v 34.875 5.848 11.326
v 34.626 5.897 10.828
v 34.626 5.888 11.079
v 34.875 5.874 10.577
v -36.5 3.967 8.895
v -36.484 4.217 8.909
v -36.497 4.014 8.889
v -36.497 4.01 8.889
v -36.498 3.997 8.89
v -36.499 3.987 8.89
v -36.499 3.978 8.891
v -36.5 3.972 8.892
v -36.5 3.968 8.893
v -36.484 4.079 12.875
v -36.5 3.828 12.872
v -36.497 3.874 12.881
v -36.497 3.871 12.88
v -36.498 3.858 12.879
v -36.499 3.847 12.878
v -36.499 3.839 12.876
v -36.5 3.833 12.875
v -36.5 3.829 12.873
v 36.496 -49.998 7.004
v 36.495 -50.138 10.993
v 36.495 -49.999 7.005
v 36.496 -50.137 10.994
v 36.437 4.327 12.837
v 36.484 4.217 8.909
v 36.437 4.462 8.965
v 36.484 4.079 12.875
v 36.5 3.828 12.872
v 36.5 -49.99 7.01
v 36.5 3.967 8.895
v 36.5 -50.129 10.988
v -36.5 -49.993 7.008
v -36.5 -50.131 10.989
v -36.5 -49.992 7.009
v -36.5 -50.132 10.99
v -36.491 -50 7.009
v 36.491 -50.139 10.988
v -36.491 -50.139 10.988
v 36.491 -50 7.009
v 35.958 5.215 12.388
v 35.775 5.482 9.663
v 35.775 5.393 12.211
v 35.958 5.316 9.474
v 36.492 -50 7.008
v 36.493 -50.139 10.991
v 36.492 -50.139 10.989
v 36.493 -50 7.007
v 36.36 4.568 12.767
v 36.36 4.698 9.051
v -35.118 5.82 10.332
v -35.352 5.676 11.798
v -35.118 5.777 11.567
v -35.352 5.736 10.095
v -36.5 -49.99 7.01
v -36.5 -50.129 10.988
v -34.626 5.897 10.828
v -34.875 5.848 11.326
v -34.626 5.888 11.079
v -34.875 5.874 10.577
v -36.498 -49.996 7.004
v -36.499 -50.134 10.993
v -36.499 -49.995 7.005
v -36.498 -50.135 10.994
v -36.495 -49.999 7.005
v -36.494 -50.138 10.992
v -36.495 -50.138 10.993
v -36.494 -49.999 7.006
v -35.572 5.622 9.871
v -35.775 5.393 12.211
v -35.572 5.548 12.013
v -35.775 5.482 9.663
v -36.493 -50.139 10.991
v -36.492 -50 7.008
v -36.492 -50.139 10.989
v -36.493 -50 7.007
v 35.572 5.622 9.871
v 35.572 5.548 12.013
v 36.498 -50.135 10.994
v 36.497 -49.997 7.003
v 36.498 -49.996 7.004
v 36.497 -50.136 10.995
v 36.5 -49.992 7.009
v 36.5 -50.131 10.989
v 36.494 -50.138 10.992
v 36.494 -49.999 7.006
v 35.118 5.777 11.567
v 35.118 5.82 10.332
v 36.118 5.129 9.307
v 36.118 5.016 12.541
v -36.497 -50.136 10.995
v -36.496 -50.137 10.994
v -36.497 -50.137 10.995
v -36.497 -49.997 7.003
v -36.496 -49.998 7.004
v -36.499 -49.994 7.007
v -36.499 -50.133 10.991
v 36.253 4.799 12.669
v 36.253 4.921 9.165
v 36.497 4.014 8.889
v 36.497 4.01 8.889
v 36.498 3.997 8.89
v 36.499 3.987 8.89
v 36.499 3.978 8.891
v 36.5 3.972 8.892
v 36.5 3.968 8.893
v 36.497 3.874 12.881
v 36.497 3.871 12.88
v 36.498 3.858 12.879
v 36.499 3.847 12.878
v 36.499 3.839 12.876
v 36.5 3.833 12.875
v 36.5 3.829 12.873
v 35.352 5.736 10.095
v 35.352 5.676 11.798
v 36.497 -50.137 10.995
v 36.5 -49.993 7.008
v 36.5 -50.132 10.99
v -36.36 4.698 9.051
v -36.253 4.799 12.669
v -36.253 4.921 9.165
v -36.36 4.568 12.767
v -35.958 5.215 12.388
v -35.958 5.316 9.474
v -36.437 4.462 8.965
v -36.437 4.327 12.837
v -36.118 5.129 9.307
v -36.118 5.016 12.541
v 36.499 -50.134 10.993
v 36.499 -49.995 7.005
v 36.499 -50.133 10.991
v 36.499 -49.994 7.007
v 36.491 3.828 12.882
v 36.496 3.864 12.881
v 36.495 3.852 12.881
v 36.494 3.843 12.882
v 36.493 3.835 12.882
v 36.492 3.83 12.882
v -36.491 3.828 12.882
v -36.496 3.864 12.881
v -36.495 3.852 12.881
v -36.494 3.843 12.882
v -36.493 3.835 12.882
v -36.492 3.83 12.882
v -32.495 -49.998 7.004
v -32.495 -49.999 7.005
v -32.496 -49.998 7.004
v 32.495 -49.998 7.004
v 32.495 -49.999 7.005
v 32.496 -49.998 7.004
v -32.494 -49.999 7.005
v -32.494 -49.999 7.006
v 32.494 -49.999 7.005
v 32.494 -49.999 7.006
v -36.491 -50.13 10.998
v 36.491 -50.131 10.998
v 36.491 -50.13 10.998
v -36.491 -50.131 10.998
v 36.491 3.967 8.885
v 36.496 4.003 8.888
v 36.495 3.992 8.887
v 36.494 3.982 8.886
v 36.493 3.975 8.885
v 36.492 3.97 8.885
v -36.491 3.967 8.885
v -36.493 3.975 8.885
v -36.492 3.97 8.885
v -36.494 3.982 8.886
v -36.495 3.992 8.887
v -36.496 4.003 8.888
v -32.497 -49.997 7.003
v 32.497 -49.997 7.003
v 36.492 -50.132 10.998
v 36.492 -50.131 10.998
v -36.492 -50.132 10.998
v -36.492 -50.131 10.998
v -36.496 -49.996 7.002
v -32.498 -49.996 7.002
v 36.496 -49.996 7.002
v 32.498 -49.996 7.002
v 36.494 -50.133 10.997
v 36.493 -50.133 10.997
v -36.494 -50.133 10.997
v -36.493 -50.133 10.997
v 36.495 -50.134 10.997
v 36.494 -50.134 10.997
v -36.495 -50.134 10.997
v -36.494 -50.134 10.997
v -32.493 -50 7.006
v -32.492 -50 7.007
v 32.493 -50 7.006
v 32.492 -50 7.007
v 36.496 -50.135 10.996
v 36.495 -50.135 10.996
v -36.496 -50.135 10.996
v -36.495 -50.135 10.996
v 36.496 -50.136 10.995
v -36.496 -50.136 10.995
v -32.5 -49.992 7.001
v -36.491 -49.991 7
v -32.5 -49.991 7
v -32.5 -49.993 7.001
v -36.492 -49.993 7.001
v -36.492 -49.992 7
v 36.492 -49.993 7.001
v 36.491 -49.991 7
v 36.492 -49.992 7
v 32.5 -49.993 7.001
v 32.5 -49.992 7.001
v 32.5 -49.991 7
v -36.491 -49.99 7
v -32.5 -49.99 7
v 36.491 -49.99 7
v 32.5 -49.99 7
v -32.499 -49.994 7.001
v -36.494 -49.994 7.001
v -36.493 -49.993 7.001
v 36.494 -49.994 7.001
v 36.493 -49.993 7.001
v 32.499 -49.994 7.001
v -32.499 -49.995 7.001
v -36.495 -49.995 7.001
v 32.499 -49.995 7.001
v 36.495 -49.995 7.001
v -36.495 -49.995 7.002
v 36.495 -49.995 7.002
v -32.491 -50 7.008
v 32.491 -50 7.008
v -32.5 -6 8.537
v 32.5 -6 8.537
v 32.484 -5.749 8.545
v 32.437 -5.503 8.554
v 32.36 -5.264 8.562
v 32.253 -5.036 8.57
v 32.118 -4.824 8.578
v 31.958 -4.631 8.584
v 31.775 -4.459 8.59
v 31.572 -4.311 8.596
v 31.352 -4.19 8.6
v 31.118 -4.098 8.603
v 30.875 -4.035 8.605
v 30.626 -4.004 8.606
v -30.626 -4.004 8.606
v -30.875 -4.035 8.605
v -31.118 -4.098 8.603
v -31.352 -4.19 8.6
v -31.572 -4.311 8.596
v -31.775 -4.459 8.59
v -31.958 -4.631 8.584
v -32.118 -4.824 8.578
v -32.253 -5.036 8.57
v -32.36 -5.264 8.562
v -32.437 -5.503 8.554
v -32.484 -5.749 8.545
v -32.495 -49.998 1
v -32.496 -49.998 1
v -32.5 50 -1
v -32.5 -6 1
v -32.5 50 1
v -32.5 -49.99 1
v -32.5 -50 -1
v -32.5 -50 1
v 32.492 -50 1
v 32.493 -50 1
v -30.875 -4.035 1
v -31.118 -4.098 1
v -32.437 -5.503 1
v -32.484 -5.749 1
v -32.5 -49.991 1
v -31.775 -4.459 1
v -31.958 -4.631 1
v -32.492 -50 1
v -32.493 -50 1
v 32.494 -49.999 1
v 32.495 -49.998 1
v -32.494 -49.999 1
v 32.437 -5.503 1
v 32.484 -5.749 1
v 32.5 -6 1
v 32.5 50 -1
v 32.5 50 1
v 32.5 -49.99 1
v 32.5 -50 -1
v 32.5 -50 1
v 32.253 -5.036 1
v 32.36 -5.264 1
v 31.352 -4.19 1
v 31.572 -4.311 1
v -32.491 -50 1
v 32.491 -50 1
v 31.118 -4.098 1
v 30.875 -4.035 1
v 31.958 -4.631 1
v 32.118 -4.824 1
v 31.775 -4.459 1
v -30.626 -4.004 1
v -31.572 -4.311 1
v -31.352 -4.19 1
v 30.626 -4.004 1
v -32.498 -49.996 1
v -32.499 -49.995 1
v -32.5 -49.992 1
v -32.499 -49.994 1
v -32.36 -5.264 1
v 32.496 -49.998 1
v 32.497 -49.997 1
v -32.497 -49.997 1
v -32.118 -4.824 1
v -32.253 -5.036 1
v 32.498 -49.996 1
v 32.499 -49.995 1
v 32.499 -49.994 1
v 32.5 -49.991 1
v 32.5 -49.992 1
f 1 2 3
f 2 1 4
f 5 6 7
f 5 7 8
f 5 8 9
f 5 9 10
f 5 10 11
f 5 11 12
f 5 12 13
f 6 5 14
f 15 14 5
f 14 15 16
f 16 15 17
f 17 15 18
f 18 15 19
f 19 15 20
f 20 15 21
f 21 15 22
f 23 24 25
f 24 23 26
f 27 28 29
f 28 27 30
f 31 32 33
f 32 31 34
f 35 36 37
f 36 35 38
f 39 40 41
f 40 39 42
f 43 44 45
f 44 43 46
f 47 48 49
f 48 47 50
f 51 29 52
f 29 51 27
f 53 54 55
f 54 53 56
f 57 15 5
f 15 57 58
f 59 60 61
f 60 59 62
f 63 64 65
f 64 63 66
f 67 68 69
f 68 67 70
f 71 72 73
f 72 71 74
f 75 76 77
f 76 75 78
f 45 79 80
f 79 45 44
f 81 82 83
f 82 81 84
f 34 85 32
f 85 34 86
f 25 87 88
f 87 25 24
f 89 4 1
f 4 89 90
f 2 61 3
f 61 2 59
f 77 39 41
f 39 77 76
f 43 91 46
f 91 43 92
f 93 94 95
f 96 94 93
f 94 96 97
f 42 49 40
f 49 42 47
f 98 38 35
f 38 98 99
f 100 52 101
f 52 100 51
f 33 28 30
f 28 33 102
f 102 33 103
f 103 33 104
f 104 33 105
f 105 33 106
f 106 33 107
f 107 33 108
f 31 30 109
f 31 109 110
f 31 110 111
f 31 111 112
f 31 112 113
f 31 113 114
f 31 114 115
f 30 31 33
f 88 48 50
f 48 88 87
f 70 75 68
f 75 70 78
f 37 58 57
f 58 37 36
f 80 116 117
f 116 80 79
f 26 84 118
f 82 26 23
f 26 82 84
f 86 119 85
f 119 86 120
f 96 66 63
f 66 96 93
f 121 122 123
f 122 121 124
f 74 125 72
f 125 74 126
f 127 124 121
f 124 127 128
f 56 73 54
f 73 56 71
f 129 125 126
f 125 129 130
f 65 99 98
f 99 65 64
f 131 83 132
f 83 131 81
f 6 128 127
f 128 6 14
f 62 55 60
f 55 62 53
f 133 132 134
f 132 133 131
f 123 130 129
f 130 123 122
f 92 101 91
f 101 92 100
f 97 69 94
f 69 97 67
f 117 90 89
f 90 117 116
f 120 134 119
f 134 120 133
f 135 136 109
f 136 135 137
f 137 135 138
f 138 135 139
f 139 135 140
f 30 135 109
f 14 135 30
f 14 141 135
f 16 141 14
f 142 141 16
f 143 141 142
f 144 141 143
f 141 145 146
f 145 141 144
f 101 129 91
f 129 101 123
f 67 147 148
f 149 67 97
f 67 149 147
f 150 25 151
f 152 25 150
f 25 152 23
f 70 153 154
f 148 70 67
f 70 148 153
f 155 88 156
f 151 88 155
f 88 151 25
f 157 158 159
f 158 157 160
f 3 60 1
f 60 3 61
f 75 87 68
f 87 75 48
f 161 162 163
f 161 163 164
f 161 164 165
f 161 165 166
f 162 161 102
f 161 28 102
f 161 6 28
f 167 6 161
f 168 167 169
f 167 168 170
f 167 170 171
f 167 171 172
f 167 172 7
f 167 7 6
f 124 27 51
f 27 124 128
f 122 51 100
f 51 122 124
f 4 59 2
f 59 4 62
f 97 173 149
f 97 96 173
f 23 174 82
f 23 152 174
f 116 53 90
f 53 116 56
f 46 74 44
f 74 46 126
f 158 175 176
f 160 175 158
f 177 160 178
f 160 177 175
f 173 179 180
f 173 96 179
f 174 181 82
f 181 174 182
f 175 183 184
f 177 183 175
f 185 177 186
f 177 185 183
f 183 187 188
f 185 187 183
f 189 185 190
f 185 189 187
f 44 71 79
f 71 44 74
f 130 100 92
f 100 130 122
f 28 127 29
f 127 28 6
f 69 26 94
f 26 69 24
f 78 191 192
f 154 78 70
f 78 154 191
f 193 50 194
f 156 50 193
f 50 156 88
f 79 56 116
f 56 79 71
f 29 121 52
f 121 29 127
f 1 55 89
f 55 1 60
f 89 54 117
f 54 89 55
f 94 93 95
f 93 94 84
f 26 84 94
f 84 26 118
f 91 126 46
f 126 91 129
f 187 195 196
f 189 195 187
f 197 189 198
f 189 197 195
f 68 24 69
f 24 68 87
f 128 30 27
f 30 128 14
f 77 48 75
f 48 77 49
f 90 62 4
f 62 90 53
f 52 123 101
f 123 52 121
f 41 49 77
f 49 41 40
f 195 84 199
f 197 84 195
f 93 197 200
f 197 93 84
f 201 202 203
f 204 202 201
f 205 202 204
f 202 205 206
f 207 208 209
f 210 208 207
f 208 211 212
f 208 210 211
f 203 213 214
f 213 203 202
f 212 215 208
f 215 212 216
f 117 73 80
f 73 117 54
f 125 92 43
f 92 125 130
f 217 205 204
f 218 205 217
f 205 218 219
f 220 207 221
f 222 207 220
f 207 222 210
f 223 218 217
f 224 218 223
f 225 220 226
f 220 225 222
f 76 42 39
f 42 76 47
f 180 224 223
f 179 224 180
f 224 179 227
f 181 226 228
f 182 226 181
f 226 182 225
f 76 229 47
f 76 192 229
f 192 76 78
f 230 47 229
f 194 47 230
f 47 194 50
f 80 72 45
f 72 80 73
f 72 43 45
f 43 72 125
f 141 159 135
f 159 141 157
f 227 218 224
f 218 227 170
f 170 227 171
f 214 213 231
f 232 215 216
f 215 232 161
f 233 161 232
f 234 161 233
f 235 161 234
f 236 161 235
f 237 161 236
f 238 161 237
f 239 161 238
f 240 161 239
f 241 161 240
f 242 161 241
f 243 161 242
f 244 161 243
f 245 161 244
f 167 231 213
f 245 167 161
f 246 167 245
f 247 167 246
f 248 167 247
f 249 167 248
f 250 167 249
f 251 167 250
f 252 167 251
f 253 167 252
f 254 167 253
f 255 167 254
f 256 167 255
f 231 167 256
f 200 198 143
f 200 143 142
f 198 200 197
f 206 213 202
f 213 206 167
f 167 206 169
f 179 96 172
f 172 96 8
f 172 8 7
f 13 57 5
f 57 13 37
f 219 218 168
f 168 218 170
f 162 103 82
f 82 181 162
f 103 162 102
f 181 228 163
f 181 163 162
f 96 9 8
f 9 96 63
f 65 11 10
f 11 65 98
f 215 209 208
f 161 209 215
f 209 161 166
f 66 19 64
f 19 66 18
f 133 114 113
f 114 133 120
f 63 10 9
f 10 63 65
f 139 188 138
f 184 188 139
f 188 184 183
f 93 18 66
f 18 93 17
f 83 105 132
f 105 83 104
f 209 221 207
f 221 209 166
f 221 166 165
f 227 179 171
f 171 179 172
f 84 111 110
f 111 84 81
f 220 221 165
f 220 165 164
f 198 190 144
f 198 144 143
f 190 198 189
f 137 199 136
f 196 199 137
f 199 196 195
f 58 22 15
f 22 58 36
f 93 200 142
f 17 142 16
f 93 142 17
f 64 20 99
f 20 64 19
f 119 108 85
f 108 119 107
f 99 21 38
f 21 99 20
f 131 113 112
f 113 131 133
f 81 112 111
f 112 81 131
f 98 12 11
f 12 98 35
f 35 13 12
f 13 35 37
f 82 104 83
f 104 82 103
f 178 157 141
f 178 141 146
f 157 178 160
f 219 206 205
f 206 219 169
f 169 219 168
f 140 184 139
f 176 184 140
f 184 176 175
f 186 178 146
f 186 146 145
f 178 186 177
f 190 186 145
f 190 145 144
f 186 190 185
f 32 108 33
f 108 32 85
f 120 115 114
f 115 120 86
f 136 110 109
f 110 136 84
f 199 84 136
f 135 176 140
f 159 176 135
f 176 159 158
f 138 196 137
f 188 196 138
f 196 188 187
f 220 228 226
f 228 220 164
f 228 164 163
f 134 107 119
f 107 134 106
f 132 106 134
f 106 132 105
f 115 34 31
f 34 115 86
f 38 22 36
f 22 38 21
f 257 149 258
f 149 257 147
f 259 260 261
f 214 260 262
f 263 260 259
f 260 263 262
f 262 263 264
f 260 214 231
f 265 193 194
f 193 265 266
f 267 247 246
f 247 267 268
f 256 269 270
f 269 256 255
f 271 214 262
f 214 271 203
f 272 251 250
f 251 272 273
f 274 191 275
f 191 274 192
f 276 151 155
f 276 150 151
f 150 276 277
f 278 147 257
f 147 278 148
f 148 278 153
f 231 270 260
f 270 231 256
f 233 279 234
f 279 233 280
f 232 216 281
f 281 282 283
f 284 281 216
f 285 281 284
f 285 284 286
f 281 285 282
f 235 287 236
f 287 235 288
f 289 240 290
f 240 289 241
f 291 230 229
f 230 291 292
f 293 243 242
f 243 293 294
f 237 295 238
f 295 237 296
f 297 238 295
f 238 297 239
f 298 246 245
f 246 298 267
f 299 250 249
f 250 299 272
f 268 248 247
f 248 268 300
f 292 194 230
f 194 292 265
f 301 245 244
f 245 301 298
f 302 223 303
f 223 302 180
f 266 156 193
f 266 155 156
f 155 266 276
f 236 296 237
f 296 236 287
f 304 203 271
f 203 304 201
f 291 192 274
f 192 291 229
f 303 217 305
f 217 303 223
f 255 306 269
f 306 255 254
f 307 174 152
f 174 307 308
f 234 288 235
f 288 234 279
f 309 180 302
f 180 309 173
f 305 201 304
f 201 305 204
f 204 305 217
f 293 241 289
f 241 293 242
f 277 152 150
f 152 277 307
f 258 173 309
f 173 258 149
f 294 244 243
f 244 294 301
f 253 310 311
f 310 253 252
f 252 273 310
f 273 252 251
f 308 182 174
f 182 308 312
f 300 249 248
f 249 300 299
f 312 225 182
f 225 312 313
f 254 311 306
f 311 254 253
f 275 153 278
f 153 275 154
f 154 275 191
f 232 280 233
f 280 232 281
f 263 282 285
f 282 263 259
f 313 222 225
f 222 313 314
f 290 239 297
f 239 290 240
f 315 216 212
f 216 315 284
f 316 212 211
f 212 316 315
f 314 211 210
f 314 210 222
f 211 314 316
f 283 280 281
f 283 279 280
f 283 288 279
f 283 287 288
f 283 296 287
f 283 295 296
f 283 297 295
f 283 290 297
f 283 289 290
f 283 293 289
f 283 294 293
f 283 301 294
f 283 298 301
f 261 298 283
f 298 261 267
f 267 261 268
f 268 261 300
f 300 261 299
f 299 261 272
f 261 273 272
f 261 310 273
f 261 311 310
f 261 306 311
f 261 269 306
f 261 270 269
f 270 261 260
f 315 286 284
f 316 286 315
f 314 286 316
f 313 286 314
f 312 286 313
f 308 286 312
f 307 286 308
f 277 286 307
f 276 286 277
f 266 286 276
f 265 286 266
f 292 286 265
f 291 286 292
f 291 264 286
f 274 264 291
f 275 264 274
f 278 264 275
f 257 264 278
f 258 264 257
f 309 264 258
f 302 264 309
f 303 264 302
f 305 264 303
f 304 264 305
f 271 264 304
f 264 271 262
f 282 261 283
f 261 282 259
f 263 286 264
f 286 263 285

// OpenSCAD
bracket = [65, 100, 2];

track = [73, 56, 4];
radius = 2;
support = [bracket[0], track[1] - 10, 8];

// WARN: too steep, and box will jam the bracket (box_back below)
angle = 2; // 12L
//angle = 4; // 7L

$fn = 50;

/* align simulated box backs below so that the top is around the top of the
 * tracks. then the bottom of the box will rest on the wall. too high, and the
 * bottom pushes into wall, jamming the slide mechanism. or too low and it
 * hangs midair, stressing the bracket attachment (glue) more. */
//color("red") box_back(310); // 12L
//color("green") box_back(175); // 7L
module box_back(height) {
	translate([track[0] / 2, track[1]-bracket[1]/2 - height, 0])
		rotate([angle, 0, 0])
		cube([1,height,1]);
}


cube(bracket, center=true);
translate(bracket * -0.5)  {
    rbox(support + [0,0,track[2]], [0.01,0.01,radius,radius]);
    translate([(bracket[0]-track[0])/2, 0, support[2]])
		rotate([angle, 0, 0])
		rcube(track, [0.01, 0.01, radius, radius], [0.01, 0.01, radius, radius], 0.01);
}


module rbox(size = [1,1,1], zr = 0.01) {
    size = (size[0] == undef) ? [size, size, size] : size;
    zr = (zr[0] == undef) ? [zr, zr, zr, zr] : zr;
    hull() {
        translate([zr[0], zr[0], 0])
			cylinder(r=zr[0], h=size[2]); // bottom-left
        translate([size[0]-zr[1], zr[1], 0])
			cylinder(r=zr[1], h=size[2]); // bottom-right
        translate([size[0]-zr[2], size[1]-zr[2], 0])
			cylinder(r=zr[2], h=size[2]); // top-right
        translate([zr[3], size[1]-zr[3], 0])
			cylinder(r=zr[3], h=size[2]); // top-left
    }
}
module rcube(size = [1,1,1], zr = 0.01, yr = 0.01, xr = 0.01) {
    size = (size[0] == undef) ? [size, size, size] : size;
    intersection() {
        rbox(size, zr); // z-corners on xy-plane
        translate([0, 0, size[2]]) rotate([0, 90, 0])
			rbox([size[2], size[1], size[0]], yr); // y-corners on zx-plane
        translate([0, size[1], 0]) rotate([90, 0, 0])
			rbox([size[0], size[2], size[1]], xr); // x-corners on yz-plane
    }
}
